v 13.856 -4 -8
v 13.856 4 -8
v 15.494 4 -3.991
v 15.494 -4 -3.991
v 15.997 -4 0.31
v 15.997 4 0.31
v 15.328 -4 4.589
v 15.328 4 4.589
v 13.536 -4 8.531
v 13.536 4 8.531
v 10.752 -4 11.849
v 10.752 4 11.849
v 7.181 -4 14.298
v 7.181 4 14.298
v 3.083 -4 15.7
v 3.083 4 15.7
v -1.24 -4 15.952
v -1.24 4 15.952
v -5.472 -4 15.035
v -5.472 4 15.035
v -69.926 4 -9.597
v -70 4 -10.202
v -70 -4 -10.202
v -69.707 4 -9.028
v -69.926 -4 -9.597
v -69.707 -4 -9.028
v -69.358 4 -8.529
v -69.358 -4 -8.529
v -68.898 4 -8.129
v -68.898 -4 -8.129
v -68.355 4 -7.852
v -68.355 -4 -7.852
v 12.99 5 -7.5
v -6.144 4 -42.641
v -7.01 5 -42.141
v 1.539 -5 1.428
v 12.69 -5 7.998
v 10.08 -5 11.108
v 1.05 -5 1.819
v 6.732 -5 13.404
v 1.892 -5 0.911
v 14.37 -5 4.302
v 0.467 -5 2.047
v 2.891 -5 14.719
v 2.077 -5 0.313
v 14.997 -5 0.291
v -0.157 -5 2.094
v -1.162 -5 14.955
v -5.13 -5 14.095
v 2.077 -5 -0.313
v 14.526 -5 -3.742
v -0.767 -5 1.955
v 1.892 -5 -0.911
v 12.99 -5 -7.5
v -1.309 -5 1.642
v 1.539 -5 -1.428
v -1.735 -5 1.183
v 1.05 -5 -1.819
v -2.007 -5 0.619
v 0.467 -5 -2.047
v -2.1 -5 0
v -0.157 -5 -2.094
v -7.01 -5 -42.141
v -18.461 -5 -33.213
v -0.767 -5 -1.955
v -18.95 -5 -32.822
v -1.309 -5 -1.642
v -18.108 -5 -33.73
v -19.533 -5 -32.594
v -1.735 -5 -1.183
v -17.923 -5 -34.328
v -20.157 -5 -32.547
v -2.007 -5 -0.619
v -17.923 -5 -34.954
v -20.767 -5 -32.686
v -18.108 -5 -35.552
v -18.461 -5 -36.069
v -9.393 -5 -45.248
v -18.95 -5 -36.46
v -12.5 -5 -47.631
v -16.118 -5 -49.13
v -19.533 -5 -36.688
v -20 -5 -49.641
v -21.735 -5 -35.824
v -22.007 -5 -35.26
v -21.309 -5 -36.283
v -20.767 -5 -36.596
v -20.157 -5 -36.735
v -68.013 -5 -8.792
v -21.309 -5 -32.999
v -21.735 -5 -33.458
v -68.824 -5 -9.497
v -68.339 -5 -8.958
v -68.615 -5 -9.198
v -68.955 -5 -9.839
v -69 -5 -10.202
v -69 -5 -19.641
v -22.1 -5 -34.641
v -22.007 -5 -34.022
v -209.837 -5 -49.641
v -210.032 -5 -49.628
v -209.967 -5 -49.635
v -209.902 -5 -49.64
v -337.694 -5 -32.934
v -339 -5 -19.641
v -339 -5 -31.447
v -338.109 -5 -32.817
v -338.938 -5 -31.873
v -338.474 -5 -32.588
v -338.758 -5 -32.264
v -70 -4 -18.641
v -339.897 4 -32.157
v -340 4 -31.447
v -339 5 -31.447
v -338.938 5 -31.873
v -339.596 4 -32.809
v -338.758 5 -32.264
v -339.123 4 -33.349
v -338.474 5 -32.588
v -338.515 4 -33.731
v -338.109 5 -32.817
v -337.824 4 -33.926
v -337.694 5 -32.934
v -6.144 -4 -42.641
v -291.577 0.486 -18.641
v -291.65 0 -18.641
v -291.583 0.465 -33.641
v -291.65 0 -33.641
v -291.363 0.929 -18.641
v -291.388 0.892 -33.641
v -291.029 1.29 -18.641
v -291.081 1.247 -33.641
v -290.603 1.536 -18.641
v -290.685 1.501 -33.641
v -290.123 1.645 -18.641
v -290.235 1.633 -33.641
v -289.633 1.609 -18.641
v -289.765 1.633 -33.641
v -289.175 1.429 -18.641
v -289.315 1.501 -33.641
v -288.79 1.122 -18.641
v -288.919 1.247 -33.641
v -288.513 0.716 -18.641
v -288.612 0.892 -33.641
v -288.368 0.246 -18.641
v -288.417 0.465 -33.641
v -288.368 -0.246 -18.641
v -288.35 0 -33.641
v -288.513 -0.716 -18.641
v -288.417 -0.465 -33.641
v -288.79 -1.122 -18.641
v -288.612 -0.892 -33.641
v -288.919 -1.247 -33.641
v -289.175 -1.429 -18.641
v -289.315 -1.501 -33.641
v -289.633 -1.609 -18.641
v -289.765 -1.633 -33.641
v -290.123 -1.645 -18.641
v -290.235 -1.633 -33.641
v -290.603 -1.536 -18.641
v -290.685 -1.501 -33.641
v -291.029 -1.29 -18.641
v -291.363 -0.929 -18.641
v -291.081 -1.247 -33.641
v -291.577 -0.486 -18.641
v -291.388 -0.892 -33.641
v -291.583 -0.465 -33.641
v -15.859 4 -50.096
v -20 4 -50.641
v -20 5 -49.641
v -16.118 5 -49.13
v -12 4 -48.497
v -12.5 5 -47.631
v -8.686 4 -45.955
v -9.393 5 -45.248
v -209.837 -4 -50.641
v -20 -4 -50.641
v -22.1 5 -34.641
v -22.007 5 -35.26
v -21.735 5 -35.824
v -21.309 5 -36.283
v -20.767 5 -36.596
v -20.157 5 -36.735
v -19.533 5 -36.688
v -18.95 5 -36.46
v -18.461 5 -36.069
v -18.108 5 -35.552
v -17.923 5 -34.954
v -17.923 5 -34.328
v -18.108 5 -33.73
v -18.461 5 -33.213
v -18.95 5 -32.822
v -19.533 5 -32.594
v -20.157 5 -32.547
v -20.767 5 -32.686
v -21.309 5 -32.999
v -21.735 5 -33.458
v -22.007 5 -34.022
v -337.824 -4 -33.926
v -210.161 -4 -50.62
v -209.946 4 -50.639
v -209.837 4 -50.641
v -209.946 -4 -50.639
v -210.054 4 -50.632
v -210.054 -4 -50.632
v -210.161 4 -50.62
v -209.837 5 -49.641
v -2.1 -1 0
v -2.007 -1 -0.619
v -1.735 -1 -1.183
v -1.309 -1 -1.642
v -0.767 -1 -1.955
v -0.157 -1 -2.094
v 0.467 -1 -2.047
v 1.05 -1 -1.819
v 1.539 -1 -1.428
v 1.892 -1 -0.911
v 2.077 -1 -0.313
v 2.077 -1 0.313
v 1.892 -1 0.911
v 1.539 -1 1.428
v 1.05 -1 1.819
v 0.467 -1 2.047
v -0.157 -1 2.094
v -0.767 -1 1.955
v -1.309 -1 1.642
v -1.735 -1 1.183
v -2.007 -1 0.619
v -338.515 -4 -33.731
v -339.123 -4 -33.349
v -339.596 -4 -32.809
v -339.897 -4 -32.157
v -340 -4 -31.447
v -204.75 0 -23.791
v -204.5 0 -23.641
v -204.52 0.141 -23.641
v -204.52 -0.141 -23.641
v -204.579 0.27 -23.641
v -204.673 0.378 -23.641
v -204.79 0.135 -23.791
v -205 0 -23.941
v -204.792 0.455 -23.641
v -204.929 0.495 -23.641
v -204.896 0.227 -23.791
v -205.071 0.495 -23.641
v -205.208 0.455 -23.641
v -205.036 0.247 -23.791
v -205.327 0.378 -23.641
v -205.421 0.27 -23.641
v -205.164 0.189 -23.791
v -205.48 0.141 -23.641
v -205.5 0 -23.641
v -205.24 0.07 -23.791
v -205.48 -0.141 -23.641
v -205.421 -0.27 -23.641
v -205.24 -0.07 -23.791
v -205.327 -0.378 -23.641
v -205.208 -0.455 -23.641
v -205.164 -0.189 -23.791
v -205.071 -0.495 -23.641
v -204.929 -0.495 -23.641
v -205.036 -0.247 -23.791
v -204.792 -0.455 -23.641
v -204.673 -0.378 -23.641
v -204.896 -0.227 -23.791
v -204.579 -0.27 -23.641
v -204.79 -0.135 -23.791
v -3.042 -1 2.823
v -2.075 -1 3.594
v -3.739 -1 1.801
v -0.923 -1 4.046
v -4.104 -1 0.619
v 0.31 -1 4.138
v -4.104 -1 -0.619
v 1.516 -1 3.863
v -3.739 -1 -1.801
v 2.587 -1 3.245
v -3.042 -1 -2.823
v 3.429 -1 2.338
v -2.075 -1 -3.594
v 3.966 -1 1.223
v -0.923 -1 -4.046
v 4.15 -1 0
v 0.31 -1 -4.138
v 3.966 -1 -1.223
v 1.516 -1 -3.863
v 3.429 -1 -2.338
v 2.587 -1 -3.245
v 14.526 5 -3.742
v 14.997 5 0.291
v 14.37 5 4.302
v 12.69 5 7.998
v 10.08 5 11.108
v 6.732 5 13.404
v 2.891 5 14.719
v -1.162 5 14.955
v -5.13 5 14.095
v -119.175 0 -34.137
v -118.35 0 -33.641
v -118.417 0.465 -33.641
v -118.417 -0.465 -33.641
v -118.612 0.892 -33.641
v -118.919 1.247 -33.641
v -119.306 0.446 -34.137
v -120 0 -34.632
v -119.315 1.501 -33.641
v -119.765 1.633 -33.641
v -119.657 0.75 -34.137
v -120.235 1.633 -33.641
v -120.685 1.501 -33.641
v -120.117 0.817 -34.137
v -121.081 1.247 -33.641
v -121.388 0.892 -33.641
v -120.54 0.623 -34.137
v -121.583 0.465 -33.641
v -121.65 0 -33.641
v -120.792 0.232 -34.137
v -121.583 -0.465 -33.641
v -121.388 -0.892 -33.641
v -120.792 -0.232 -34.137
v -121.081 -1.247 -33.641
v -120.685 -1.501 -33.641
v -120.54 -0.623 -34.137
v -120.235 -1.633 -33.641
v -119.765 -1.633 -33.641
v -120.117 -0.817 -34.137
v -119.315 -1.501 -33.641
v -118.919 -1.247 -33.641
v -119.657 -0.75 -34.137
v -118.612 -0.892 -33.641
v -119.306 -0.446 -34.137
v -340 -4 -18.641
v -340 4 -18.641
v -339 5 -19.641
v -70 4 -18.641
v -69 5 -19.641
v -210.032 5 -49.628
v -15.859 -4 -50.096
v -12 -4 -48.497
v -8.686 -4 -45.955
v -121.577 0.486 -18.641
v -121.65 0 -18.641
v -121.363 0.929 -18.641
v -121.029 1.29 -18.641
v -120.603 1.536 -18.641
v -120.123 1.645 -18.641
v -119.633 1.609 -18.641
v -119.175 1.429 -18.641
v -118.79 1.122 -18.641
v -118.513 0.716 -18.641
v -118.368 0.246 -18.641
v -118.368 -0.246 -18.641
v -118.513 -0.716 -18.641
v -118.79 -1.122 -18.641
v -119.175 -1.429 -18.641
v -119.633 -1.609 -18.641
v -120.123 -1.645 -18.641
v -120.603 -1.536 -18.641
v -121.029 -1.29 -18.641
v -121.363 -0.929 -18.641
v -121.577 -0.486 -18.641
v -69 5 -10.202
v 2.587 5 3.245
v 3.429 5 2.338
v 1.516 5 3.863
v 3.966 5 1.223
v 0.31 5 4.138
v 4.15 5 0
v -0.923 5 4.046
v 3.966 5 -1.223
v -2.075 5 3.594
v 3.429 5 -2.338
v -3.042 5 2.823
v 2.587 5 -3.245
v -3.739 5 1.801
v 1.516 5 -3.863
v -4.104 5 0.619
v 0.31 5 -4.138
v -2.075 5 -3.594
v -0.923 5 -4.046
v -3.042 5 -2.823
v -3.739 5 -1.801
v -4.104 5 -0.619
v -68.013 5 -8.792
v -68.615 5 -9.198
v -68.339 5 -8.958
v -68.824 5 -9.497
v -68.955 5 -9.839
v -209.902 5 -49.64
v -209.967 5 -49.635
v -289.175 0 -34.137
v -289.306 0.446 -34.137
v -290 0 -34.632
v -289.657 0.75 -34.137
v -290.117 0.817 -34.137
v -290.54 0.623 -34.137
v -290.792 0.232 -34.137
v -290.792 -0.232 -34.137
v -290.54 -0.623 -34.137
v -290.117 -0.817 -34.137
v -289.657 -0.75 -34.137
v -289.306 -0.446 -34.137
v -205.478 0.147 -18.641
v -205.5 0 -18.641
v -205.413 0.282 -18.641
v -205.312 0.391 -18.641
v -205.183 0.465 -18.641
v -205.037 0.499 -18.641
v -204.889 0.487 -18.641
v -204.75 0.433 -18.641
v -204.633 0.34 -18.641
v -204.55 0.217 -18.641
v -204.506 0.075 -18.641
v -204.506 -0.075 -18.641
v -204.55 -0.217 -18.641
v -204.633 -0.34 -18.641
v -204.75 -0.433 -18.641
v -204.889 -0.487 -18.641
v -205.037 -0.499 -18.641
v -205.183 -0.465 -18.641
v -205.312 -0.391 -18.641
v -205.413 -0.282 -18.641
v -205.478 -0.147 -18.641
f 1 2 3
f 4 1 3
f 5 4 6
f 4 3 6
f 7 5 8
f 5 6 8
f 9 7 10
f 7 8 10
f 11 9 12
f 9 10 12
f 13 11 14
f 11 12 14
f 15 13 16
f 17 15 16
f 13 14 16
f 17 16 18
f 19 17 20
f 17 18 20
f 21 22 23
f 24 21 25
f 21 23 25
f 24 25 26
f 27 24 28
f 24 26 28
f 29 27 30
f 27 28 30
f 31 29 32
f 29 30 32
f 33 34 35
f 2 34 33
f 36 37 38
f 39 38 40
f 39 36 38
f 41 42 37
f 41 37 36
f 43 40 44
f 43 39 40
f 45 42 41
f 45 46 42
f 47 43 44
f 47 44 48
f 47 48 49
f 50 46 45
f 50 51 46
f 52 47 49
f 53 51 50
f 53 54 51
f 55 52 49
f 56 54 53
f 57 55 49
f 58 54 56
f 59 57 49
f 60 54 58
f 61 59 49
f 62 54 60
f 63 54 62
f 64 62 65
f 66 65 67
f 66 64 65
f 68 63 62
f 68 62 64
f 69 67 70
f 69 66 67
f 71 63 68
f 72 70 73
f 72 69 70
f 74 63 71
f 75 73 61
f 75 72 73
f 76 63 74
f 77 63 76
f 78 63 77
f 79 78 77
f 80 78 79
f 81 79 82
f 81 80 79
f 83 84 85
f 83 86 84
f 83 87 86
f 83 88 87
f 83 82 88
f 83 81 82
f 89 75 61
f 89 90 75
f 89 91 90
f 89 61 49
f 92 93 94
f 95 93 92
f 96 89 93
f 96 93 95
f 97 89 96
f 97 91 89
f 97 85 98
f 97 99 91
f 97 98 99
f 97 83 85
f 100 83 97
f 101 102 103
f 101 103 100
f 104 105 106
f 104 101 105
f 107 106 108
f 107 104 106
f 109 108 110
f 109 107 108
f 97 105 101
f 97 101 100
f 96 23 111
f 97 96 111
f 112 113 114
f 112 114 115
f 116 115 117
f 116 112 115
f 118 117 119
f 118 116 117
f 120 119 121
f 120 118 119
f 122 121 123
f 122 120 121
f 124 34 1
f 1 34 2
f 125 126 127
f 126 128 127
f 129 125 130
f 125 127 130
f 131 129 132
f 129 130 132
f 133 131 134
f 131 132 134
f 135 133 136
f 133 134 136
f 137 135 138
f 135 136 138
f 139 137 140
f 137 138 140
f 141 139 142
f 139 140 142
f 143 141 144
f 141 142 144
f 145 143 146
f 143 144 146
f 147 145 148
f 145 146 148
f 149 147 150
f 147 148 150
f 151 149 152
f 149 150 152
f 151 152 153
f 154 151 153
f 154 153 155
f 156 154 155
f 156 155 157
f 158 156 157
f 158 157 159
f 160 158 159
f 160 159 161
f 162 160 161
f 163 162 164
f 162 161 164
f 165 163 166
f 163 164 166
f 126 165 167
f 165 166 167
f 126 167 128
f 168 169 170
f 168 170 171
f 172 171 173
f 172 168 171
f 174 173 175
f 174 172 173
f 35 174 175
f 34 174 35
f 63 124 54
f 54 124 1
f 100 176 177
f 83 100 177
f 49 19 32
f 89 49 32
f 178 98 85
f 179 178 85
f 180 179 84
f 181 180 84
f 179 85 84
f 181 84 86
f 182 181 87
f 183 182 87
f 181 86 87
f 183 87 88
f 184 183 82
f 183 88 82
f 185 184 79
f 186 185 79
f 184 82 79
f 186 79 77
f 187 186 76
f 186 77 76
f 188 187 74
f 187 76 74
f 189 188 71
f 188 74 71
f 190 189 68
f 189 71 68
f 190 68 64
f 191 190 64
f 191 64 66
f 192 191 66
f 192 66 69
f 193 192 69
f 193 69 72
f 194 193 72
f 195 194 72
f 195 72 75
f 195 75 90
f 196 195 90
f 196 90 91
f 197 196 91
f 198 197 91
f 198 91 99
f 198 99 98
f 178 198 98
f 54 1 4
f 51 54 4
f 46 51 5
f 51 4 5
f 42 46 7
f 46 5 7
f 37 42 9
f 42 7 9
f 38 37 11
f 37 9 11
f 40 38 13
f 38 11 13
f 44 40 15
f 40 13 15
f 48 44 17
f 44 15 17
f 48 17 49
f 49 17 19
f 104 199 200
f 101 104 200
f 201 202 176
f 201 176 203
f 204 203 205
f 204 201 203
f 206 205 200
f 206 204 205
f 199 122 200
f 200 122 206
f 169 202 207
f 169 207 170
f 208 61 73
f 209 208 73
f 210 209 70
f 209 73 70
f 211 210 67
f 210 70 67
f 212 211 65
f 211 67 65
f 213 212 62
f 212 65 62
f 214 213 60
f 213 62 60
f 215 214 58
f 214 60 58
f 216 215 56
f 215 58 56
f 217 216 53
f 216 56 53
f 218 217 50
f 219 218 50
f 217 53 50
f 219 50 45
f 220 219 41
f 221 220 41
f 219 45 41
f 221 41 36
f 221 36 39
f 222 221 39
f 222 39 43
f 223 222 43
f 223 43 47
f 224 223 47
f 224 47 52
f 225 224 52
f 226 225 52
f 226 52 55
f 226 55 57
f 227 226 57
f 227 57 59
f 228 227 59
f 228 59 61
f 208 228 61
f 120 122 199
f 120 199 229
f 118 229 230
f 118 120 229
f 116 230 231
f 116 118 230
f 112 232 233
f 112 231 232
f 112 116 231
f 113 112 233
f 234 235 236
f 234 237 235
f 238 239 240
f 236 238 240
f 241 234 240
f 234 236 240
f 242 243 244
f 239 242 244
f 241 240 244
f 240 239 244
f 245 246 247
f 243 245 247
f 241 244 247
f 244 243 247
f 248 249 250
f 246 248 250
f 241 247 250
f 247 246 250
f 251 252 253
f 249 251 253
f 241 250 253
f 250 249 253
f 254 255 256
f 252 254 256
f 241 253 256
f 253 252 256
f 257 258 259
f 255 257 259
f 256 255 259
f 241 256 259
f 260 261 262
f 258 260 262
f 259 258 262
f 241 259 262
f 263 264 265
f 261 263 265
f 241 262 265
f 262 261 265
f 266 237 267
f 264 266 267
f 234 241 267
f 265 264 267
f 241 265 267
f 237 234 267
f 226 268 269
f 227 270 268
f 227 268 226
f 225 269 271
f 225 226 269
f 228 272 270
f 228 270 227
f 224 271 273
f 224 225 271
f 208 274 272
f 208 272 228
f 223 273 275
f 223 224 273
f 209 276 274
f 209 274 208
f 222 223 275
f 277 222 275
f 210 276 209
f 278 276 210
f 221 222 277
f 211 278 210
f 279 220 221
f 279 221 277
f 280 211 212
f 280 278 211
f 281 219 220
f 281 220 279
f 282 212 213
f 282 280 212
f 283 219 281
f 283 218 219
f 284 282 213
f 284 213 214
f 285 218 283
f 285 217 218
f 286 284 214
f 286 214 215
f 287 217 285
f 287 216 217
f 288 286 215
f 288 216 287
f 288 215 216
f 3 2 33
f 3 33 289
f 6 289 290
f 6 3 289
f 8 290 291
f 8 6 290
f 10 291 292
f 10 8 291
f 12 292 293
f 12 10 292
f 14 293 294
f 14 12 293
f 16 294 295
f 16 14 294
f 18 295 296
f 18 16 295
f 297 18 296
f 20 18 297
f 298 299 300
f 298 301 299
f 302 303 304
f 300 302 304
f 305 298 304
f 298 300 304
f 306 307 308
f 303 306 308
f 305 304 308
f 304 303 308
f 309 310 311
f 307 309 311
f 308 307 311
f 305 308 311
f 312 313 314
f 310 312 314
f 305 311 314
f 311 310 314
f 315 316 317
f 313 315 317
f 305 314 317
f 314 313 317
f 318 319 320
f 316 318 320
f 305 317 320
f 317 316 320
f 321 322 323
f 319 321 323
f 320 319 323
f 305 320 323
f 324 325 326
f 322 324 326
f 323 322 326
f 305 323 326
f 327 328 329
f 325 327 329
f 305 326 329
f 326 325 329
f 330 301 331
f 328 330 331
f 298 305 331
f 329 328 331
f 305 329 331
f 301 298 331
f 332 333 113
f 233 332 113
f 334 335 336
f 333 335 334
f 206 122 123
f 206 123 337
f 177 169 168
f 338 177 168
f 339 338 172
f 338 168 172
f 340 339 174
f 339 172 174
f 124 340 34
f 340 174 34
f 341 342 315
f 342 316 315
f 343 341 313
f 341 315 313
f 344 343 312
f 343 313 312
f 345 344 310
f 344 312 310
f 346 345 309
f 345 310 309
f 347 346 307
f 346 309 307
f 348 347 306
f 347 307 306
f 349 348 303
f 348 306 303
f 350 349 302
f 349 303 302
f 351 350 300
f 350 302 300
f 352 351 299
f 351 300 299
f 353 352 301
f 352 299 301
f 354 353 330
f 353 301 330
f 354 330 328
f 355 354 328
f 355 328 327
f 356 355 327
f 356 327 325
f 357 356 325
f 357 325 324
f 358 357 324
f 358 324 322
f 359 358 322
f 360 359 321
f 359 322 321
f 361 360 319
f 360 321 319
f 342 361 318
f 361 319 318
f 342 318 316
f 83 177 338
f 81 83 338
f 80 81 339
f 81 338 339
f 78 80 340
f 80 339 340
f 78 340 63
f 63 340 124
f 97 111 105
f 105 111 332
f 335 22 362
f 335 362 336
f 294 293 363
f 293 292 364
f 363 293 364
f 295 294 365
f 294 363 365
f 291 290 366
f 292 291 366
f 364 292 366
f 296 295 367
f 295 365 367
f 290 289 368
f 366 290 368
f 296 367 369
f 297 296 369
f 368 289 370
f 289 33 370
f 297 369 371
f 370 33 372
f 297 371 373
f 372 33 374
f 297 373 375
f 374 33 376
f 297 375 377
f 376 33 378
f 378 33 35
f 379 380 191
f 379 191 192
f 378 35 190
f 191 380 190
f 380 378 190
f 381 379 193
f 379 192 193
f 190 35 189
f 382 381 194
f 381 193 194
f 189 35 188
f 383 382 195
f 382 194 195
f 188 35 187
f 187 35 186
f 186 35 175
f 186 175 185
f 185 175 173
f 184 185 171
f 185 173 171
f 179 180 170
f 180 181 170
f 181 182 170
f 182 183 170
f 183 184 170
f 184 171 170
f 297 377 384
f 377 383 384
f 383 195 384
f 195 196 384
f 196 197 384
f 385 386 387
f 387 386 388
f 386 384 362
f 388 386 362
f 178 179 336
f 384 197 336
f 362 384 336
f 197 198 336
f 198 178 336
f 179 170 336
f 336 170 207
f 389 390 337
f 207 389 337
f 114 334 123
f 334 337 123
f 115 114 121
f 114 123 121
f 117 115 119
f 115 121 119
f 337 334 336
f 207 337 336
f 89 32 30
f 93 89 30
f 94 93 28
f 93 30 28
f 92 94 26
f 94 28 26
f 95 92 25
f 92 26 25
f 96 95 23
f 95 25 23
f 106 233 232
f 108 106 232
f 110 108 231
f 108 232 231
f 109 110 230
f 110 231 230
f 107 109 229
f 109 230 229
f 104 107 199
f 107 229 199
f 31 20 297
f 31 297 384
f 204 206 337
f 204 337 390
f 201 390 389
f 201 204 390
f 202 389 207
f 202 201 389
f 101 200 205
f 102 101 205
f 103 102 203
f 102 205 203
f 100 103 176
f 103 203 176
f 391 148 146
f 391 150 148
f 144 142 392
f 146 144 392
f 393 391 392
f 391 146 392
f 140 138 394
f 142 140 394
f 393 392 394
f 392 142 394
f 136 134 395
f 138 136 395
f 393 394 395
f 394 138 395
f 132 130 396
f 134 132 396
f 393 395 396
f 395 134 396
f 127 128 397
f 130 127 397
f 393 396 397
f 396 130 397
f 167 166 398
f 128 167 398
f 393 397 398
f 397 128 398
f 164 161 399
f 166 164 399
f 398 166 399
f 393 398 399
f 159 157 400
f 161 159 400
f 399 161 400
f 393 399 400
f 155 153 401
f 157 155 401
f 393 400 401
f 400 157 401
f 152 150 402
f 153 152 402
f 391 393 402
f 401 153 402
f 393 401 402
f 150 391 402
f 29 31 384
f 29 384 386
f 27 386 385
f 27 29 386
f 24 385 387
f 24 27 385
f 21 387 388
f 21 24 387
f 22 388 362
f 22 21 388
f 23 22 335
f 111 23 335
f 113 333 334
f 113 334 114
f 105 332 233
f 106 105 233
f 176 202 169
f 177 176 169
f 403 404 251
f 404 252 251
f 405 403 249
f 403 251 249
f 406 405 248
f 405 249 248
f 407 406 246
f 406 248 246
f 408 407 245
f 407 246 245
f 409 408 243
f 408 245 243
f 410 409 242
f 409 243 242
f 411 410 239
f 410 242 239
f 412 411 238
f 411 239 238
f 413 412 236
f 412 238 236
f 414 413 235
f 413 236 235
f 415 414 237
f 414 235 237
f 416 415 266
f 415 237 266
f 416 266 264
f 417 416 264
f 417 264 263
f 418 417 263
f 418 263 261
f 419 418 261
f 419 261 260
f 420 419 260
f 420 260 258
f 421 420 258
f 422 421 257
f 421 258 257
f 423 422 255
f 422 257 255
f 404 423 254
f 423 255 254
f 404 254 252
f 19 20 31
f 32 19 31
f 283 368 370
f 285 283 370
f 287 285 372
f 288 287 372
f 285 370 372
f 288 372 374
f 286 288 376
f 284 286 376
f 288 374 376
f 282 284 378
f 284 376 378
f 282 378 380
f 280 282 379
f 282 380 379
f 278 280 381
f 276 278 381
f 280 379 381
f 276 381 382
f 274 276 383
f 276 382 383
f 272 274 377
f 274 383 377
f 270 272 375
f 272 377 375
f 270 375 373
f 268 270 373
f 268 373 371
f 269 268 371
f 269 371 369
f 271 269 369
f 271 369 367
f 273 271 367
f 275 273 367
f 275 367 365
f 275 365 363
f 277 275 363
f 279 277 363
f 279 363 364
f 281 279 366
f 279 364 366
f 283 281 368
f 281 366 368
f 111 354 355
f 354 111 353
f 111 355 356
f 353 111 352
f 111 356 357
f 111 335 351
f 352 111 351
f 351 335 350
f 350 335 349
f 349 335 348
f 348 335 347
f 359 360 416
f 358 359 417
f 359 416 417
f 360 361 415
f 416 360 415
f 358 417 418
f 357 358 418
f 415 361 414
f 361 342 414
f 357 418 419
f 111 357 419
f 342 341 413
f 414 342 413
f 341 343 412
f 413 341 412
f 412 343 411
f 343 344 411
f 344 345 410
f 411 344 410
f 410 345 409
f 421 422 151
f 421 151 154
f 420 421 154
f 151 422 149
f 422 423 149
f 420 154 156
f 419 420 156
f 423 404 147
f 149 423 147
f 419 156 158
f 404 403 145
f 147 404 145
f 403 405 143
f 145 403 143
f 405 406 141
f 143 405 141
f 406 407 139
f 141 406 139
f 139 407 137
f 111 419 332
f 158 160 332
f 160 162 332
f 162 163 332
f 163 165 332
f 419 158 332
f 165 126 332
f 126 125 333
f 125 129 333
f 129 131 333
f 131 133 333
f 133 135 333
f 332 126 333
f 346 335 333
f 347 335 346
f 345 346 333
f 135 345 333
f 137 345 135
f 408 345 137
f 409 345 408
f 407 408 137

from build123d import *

# Parameters (mm, degrees)
BOSS_EXTRUDE1_DEPTH       = 5
M5X0_8_TAPPED_HOLE1_D     = 4.2
SKETCH5_R                 = 4.15
CUT_EXTRUDE1_DEPTH        = 6
M4X0_7_TAPPED_HOLE1_D     = 3.3
M4X0_7_TAPPED_HOLE1_DEPTH = 15
M4X0_7_TAPPED_HOLE1_TIP   = 0.991420021
FILLET1_R                 = 2.5
CHAMFER1_SIZE             = 1
F_1_0MM_DOWEL_HOLE1_D     = 1
F_1_0MM_DOWEL_HOLE1_DEPTH = 5
F_1_0MM_DOWEL_HOLE1_TIP   = 0.30043031


with BuildPart() as part:
    # Sketch2 → Boss-Extrude1 (new body, symmetric)
    with BuildSketch(Plane(origin=(0, 0, 0), x_dir=(1, 0, 0), z_dir=(0, 1, 0))):
        with BuildLine():
            Line((-210, 50.641016151), (-20, 50.641016151))
            ThreePointArc((-20, 50.641016151), (-12, 48.497422612), (-6.143593539, 42.641016151))
            Line((-6.143593539, 42.641016151), (13.856406461, 8))
            ThreePointArc((13.856406461, 8), (12.25671109, -10.284601755), (-5.472322293, -15.035081933))
            Line((-5.472322293, -15.035081933), (-70, 8.451072039))
            Line((-70, 8.451072039), (-70, 18.641016151))
            Line((-70, 18.641016151), (-340, 18.641016151))
            Line((-340, 18.641016151), (-340, 33.641016151))
            Line((-340, 33.641016151), (-210, 50.641016151))
        make_face()
    extrude(amount=BOSS_EXTRUDE1_DEPTH, both=True)

    # M5x0.8 Tapped Hole1 (through all)
    with Locations(Plane(origin=(0, 5, 0), x_dir=(1, 0, 0), z_dir=(0, 1, 0))):
        with Locations((-20, 34.641016151), (0, 0)):
            Hole(M5X0_8_TAPPED_HOLE1_D / 2)

    # Sketch5 → Cut-Extrude1 (cut)
    with BuildSketch(Plane(origin=(0, 5, 0), x_dir=(1, 0, 0), z_dir=(0, 1, 0))):
        Circle(SKETCH5_R)
    extrude(amount=-CUT_EXTRUDE1_DEPTH, mode=Mode.SUBTRACT)

    # M4x0.7 Tapped Hole1
    with Locations(Plane.XY.offset(-18.641016151)):
        with Locations((-290, 0), (-120, 0)):
            Hole(M4X0_7_TAPPED_HOLE1_D / 2, depth=M4X0_7_TAPPED_HOLE1_DEPTH)
            with Locations((0, 0, -(M4X0_7_TAPPED_HOLE1_DEPTH + M4X0_7_TAPPED_HOLE1_TIP / 2))):  # 118° drill point
                Cone(0, M4X0_7_TAPPED_HOLE1_D / 2, M4X0_7_TAPPED_HOLE1_TIP, mode=Mode.SUBTRACT)

    # Fillet1
    fillet1_edges = [part.edges().sort_by_distance(p)[0] for p in [
        (-70, 0, -8.451072039),
        (-340, 0, -33.641016151),
        (-210, 0, -50.641016151),
    ]]
    fillet(fillet1_edges, radius=FILLET1_R)

    # Chamfer1
    chamfer1_edges = [part.edges().sort_by_distance(p)[0] for p in [
        (-70, -5, -14.421303518),
        (-205, -5, -18.641016151),
        (-114.918615686, -5, -50.641016151),
        (-12, -5, -48.497422612),
        (-205, 5, -18.641016151),
        (-70, 5, -14.421303518),
        (12.25671109, 5, 10.284601755),
        (3.856406461, 5, -25.320508076),
        (-12, 5, -48.497422612),
        (-273.992778821, -5, -42.27272969),
        (-273.992778821, 5, -42.27272969),
        (-36.913686326, -5, 3.5913613),
        (-340, -5, -25.043835126),
        (-69.547880111, -5, -8.767649794),
        (-339.37888369, -5, -33.095834527),
        (-209.999656106, -5, -50.635734213),
        (-340, 5, -25.043835126),
        (-36.913686326, 5, 3.5913613),
        (-69.547880111, 5, -8.767649794),
        (-339.37888369, 5, -33.095834527),
        (-209.999656106, 5, -50.635734213),
        (-114.918615686, 5, -50.641016151),
        (3.856406461, -5, -25.320508076),
        (12.25671109, -5, 10.284601755),
    ]]
    chamfer(chamfer1_edges, length=CHAMFER1_SIZE)

    # Ø1.0mm Dowel Hole1
    with Locations(Plane.XY.offset(-18.641016151)):
        with Locations((-205, 0)):
            Hole(F_1_0MM_DOWEL_HOLE1_D / 2, depth=F_1_0MM_DOWEL_HOLE1_DEPTH)
            with Locations((0, 0, -(F_1_0MM_DOWEL_HOLE1_DEPTH + F_1_0MM_DOWEL_HOLE1_TIP / 2))):  # 118° drill point
                Cone(0, F_1_0MM_DOWEL_HOLE1_D / 2, F_1_0MM_DOWEL_HOLE1_TIP, mode=Mode.SUBTRACT)


solid = part.part
